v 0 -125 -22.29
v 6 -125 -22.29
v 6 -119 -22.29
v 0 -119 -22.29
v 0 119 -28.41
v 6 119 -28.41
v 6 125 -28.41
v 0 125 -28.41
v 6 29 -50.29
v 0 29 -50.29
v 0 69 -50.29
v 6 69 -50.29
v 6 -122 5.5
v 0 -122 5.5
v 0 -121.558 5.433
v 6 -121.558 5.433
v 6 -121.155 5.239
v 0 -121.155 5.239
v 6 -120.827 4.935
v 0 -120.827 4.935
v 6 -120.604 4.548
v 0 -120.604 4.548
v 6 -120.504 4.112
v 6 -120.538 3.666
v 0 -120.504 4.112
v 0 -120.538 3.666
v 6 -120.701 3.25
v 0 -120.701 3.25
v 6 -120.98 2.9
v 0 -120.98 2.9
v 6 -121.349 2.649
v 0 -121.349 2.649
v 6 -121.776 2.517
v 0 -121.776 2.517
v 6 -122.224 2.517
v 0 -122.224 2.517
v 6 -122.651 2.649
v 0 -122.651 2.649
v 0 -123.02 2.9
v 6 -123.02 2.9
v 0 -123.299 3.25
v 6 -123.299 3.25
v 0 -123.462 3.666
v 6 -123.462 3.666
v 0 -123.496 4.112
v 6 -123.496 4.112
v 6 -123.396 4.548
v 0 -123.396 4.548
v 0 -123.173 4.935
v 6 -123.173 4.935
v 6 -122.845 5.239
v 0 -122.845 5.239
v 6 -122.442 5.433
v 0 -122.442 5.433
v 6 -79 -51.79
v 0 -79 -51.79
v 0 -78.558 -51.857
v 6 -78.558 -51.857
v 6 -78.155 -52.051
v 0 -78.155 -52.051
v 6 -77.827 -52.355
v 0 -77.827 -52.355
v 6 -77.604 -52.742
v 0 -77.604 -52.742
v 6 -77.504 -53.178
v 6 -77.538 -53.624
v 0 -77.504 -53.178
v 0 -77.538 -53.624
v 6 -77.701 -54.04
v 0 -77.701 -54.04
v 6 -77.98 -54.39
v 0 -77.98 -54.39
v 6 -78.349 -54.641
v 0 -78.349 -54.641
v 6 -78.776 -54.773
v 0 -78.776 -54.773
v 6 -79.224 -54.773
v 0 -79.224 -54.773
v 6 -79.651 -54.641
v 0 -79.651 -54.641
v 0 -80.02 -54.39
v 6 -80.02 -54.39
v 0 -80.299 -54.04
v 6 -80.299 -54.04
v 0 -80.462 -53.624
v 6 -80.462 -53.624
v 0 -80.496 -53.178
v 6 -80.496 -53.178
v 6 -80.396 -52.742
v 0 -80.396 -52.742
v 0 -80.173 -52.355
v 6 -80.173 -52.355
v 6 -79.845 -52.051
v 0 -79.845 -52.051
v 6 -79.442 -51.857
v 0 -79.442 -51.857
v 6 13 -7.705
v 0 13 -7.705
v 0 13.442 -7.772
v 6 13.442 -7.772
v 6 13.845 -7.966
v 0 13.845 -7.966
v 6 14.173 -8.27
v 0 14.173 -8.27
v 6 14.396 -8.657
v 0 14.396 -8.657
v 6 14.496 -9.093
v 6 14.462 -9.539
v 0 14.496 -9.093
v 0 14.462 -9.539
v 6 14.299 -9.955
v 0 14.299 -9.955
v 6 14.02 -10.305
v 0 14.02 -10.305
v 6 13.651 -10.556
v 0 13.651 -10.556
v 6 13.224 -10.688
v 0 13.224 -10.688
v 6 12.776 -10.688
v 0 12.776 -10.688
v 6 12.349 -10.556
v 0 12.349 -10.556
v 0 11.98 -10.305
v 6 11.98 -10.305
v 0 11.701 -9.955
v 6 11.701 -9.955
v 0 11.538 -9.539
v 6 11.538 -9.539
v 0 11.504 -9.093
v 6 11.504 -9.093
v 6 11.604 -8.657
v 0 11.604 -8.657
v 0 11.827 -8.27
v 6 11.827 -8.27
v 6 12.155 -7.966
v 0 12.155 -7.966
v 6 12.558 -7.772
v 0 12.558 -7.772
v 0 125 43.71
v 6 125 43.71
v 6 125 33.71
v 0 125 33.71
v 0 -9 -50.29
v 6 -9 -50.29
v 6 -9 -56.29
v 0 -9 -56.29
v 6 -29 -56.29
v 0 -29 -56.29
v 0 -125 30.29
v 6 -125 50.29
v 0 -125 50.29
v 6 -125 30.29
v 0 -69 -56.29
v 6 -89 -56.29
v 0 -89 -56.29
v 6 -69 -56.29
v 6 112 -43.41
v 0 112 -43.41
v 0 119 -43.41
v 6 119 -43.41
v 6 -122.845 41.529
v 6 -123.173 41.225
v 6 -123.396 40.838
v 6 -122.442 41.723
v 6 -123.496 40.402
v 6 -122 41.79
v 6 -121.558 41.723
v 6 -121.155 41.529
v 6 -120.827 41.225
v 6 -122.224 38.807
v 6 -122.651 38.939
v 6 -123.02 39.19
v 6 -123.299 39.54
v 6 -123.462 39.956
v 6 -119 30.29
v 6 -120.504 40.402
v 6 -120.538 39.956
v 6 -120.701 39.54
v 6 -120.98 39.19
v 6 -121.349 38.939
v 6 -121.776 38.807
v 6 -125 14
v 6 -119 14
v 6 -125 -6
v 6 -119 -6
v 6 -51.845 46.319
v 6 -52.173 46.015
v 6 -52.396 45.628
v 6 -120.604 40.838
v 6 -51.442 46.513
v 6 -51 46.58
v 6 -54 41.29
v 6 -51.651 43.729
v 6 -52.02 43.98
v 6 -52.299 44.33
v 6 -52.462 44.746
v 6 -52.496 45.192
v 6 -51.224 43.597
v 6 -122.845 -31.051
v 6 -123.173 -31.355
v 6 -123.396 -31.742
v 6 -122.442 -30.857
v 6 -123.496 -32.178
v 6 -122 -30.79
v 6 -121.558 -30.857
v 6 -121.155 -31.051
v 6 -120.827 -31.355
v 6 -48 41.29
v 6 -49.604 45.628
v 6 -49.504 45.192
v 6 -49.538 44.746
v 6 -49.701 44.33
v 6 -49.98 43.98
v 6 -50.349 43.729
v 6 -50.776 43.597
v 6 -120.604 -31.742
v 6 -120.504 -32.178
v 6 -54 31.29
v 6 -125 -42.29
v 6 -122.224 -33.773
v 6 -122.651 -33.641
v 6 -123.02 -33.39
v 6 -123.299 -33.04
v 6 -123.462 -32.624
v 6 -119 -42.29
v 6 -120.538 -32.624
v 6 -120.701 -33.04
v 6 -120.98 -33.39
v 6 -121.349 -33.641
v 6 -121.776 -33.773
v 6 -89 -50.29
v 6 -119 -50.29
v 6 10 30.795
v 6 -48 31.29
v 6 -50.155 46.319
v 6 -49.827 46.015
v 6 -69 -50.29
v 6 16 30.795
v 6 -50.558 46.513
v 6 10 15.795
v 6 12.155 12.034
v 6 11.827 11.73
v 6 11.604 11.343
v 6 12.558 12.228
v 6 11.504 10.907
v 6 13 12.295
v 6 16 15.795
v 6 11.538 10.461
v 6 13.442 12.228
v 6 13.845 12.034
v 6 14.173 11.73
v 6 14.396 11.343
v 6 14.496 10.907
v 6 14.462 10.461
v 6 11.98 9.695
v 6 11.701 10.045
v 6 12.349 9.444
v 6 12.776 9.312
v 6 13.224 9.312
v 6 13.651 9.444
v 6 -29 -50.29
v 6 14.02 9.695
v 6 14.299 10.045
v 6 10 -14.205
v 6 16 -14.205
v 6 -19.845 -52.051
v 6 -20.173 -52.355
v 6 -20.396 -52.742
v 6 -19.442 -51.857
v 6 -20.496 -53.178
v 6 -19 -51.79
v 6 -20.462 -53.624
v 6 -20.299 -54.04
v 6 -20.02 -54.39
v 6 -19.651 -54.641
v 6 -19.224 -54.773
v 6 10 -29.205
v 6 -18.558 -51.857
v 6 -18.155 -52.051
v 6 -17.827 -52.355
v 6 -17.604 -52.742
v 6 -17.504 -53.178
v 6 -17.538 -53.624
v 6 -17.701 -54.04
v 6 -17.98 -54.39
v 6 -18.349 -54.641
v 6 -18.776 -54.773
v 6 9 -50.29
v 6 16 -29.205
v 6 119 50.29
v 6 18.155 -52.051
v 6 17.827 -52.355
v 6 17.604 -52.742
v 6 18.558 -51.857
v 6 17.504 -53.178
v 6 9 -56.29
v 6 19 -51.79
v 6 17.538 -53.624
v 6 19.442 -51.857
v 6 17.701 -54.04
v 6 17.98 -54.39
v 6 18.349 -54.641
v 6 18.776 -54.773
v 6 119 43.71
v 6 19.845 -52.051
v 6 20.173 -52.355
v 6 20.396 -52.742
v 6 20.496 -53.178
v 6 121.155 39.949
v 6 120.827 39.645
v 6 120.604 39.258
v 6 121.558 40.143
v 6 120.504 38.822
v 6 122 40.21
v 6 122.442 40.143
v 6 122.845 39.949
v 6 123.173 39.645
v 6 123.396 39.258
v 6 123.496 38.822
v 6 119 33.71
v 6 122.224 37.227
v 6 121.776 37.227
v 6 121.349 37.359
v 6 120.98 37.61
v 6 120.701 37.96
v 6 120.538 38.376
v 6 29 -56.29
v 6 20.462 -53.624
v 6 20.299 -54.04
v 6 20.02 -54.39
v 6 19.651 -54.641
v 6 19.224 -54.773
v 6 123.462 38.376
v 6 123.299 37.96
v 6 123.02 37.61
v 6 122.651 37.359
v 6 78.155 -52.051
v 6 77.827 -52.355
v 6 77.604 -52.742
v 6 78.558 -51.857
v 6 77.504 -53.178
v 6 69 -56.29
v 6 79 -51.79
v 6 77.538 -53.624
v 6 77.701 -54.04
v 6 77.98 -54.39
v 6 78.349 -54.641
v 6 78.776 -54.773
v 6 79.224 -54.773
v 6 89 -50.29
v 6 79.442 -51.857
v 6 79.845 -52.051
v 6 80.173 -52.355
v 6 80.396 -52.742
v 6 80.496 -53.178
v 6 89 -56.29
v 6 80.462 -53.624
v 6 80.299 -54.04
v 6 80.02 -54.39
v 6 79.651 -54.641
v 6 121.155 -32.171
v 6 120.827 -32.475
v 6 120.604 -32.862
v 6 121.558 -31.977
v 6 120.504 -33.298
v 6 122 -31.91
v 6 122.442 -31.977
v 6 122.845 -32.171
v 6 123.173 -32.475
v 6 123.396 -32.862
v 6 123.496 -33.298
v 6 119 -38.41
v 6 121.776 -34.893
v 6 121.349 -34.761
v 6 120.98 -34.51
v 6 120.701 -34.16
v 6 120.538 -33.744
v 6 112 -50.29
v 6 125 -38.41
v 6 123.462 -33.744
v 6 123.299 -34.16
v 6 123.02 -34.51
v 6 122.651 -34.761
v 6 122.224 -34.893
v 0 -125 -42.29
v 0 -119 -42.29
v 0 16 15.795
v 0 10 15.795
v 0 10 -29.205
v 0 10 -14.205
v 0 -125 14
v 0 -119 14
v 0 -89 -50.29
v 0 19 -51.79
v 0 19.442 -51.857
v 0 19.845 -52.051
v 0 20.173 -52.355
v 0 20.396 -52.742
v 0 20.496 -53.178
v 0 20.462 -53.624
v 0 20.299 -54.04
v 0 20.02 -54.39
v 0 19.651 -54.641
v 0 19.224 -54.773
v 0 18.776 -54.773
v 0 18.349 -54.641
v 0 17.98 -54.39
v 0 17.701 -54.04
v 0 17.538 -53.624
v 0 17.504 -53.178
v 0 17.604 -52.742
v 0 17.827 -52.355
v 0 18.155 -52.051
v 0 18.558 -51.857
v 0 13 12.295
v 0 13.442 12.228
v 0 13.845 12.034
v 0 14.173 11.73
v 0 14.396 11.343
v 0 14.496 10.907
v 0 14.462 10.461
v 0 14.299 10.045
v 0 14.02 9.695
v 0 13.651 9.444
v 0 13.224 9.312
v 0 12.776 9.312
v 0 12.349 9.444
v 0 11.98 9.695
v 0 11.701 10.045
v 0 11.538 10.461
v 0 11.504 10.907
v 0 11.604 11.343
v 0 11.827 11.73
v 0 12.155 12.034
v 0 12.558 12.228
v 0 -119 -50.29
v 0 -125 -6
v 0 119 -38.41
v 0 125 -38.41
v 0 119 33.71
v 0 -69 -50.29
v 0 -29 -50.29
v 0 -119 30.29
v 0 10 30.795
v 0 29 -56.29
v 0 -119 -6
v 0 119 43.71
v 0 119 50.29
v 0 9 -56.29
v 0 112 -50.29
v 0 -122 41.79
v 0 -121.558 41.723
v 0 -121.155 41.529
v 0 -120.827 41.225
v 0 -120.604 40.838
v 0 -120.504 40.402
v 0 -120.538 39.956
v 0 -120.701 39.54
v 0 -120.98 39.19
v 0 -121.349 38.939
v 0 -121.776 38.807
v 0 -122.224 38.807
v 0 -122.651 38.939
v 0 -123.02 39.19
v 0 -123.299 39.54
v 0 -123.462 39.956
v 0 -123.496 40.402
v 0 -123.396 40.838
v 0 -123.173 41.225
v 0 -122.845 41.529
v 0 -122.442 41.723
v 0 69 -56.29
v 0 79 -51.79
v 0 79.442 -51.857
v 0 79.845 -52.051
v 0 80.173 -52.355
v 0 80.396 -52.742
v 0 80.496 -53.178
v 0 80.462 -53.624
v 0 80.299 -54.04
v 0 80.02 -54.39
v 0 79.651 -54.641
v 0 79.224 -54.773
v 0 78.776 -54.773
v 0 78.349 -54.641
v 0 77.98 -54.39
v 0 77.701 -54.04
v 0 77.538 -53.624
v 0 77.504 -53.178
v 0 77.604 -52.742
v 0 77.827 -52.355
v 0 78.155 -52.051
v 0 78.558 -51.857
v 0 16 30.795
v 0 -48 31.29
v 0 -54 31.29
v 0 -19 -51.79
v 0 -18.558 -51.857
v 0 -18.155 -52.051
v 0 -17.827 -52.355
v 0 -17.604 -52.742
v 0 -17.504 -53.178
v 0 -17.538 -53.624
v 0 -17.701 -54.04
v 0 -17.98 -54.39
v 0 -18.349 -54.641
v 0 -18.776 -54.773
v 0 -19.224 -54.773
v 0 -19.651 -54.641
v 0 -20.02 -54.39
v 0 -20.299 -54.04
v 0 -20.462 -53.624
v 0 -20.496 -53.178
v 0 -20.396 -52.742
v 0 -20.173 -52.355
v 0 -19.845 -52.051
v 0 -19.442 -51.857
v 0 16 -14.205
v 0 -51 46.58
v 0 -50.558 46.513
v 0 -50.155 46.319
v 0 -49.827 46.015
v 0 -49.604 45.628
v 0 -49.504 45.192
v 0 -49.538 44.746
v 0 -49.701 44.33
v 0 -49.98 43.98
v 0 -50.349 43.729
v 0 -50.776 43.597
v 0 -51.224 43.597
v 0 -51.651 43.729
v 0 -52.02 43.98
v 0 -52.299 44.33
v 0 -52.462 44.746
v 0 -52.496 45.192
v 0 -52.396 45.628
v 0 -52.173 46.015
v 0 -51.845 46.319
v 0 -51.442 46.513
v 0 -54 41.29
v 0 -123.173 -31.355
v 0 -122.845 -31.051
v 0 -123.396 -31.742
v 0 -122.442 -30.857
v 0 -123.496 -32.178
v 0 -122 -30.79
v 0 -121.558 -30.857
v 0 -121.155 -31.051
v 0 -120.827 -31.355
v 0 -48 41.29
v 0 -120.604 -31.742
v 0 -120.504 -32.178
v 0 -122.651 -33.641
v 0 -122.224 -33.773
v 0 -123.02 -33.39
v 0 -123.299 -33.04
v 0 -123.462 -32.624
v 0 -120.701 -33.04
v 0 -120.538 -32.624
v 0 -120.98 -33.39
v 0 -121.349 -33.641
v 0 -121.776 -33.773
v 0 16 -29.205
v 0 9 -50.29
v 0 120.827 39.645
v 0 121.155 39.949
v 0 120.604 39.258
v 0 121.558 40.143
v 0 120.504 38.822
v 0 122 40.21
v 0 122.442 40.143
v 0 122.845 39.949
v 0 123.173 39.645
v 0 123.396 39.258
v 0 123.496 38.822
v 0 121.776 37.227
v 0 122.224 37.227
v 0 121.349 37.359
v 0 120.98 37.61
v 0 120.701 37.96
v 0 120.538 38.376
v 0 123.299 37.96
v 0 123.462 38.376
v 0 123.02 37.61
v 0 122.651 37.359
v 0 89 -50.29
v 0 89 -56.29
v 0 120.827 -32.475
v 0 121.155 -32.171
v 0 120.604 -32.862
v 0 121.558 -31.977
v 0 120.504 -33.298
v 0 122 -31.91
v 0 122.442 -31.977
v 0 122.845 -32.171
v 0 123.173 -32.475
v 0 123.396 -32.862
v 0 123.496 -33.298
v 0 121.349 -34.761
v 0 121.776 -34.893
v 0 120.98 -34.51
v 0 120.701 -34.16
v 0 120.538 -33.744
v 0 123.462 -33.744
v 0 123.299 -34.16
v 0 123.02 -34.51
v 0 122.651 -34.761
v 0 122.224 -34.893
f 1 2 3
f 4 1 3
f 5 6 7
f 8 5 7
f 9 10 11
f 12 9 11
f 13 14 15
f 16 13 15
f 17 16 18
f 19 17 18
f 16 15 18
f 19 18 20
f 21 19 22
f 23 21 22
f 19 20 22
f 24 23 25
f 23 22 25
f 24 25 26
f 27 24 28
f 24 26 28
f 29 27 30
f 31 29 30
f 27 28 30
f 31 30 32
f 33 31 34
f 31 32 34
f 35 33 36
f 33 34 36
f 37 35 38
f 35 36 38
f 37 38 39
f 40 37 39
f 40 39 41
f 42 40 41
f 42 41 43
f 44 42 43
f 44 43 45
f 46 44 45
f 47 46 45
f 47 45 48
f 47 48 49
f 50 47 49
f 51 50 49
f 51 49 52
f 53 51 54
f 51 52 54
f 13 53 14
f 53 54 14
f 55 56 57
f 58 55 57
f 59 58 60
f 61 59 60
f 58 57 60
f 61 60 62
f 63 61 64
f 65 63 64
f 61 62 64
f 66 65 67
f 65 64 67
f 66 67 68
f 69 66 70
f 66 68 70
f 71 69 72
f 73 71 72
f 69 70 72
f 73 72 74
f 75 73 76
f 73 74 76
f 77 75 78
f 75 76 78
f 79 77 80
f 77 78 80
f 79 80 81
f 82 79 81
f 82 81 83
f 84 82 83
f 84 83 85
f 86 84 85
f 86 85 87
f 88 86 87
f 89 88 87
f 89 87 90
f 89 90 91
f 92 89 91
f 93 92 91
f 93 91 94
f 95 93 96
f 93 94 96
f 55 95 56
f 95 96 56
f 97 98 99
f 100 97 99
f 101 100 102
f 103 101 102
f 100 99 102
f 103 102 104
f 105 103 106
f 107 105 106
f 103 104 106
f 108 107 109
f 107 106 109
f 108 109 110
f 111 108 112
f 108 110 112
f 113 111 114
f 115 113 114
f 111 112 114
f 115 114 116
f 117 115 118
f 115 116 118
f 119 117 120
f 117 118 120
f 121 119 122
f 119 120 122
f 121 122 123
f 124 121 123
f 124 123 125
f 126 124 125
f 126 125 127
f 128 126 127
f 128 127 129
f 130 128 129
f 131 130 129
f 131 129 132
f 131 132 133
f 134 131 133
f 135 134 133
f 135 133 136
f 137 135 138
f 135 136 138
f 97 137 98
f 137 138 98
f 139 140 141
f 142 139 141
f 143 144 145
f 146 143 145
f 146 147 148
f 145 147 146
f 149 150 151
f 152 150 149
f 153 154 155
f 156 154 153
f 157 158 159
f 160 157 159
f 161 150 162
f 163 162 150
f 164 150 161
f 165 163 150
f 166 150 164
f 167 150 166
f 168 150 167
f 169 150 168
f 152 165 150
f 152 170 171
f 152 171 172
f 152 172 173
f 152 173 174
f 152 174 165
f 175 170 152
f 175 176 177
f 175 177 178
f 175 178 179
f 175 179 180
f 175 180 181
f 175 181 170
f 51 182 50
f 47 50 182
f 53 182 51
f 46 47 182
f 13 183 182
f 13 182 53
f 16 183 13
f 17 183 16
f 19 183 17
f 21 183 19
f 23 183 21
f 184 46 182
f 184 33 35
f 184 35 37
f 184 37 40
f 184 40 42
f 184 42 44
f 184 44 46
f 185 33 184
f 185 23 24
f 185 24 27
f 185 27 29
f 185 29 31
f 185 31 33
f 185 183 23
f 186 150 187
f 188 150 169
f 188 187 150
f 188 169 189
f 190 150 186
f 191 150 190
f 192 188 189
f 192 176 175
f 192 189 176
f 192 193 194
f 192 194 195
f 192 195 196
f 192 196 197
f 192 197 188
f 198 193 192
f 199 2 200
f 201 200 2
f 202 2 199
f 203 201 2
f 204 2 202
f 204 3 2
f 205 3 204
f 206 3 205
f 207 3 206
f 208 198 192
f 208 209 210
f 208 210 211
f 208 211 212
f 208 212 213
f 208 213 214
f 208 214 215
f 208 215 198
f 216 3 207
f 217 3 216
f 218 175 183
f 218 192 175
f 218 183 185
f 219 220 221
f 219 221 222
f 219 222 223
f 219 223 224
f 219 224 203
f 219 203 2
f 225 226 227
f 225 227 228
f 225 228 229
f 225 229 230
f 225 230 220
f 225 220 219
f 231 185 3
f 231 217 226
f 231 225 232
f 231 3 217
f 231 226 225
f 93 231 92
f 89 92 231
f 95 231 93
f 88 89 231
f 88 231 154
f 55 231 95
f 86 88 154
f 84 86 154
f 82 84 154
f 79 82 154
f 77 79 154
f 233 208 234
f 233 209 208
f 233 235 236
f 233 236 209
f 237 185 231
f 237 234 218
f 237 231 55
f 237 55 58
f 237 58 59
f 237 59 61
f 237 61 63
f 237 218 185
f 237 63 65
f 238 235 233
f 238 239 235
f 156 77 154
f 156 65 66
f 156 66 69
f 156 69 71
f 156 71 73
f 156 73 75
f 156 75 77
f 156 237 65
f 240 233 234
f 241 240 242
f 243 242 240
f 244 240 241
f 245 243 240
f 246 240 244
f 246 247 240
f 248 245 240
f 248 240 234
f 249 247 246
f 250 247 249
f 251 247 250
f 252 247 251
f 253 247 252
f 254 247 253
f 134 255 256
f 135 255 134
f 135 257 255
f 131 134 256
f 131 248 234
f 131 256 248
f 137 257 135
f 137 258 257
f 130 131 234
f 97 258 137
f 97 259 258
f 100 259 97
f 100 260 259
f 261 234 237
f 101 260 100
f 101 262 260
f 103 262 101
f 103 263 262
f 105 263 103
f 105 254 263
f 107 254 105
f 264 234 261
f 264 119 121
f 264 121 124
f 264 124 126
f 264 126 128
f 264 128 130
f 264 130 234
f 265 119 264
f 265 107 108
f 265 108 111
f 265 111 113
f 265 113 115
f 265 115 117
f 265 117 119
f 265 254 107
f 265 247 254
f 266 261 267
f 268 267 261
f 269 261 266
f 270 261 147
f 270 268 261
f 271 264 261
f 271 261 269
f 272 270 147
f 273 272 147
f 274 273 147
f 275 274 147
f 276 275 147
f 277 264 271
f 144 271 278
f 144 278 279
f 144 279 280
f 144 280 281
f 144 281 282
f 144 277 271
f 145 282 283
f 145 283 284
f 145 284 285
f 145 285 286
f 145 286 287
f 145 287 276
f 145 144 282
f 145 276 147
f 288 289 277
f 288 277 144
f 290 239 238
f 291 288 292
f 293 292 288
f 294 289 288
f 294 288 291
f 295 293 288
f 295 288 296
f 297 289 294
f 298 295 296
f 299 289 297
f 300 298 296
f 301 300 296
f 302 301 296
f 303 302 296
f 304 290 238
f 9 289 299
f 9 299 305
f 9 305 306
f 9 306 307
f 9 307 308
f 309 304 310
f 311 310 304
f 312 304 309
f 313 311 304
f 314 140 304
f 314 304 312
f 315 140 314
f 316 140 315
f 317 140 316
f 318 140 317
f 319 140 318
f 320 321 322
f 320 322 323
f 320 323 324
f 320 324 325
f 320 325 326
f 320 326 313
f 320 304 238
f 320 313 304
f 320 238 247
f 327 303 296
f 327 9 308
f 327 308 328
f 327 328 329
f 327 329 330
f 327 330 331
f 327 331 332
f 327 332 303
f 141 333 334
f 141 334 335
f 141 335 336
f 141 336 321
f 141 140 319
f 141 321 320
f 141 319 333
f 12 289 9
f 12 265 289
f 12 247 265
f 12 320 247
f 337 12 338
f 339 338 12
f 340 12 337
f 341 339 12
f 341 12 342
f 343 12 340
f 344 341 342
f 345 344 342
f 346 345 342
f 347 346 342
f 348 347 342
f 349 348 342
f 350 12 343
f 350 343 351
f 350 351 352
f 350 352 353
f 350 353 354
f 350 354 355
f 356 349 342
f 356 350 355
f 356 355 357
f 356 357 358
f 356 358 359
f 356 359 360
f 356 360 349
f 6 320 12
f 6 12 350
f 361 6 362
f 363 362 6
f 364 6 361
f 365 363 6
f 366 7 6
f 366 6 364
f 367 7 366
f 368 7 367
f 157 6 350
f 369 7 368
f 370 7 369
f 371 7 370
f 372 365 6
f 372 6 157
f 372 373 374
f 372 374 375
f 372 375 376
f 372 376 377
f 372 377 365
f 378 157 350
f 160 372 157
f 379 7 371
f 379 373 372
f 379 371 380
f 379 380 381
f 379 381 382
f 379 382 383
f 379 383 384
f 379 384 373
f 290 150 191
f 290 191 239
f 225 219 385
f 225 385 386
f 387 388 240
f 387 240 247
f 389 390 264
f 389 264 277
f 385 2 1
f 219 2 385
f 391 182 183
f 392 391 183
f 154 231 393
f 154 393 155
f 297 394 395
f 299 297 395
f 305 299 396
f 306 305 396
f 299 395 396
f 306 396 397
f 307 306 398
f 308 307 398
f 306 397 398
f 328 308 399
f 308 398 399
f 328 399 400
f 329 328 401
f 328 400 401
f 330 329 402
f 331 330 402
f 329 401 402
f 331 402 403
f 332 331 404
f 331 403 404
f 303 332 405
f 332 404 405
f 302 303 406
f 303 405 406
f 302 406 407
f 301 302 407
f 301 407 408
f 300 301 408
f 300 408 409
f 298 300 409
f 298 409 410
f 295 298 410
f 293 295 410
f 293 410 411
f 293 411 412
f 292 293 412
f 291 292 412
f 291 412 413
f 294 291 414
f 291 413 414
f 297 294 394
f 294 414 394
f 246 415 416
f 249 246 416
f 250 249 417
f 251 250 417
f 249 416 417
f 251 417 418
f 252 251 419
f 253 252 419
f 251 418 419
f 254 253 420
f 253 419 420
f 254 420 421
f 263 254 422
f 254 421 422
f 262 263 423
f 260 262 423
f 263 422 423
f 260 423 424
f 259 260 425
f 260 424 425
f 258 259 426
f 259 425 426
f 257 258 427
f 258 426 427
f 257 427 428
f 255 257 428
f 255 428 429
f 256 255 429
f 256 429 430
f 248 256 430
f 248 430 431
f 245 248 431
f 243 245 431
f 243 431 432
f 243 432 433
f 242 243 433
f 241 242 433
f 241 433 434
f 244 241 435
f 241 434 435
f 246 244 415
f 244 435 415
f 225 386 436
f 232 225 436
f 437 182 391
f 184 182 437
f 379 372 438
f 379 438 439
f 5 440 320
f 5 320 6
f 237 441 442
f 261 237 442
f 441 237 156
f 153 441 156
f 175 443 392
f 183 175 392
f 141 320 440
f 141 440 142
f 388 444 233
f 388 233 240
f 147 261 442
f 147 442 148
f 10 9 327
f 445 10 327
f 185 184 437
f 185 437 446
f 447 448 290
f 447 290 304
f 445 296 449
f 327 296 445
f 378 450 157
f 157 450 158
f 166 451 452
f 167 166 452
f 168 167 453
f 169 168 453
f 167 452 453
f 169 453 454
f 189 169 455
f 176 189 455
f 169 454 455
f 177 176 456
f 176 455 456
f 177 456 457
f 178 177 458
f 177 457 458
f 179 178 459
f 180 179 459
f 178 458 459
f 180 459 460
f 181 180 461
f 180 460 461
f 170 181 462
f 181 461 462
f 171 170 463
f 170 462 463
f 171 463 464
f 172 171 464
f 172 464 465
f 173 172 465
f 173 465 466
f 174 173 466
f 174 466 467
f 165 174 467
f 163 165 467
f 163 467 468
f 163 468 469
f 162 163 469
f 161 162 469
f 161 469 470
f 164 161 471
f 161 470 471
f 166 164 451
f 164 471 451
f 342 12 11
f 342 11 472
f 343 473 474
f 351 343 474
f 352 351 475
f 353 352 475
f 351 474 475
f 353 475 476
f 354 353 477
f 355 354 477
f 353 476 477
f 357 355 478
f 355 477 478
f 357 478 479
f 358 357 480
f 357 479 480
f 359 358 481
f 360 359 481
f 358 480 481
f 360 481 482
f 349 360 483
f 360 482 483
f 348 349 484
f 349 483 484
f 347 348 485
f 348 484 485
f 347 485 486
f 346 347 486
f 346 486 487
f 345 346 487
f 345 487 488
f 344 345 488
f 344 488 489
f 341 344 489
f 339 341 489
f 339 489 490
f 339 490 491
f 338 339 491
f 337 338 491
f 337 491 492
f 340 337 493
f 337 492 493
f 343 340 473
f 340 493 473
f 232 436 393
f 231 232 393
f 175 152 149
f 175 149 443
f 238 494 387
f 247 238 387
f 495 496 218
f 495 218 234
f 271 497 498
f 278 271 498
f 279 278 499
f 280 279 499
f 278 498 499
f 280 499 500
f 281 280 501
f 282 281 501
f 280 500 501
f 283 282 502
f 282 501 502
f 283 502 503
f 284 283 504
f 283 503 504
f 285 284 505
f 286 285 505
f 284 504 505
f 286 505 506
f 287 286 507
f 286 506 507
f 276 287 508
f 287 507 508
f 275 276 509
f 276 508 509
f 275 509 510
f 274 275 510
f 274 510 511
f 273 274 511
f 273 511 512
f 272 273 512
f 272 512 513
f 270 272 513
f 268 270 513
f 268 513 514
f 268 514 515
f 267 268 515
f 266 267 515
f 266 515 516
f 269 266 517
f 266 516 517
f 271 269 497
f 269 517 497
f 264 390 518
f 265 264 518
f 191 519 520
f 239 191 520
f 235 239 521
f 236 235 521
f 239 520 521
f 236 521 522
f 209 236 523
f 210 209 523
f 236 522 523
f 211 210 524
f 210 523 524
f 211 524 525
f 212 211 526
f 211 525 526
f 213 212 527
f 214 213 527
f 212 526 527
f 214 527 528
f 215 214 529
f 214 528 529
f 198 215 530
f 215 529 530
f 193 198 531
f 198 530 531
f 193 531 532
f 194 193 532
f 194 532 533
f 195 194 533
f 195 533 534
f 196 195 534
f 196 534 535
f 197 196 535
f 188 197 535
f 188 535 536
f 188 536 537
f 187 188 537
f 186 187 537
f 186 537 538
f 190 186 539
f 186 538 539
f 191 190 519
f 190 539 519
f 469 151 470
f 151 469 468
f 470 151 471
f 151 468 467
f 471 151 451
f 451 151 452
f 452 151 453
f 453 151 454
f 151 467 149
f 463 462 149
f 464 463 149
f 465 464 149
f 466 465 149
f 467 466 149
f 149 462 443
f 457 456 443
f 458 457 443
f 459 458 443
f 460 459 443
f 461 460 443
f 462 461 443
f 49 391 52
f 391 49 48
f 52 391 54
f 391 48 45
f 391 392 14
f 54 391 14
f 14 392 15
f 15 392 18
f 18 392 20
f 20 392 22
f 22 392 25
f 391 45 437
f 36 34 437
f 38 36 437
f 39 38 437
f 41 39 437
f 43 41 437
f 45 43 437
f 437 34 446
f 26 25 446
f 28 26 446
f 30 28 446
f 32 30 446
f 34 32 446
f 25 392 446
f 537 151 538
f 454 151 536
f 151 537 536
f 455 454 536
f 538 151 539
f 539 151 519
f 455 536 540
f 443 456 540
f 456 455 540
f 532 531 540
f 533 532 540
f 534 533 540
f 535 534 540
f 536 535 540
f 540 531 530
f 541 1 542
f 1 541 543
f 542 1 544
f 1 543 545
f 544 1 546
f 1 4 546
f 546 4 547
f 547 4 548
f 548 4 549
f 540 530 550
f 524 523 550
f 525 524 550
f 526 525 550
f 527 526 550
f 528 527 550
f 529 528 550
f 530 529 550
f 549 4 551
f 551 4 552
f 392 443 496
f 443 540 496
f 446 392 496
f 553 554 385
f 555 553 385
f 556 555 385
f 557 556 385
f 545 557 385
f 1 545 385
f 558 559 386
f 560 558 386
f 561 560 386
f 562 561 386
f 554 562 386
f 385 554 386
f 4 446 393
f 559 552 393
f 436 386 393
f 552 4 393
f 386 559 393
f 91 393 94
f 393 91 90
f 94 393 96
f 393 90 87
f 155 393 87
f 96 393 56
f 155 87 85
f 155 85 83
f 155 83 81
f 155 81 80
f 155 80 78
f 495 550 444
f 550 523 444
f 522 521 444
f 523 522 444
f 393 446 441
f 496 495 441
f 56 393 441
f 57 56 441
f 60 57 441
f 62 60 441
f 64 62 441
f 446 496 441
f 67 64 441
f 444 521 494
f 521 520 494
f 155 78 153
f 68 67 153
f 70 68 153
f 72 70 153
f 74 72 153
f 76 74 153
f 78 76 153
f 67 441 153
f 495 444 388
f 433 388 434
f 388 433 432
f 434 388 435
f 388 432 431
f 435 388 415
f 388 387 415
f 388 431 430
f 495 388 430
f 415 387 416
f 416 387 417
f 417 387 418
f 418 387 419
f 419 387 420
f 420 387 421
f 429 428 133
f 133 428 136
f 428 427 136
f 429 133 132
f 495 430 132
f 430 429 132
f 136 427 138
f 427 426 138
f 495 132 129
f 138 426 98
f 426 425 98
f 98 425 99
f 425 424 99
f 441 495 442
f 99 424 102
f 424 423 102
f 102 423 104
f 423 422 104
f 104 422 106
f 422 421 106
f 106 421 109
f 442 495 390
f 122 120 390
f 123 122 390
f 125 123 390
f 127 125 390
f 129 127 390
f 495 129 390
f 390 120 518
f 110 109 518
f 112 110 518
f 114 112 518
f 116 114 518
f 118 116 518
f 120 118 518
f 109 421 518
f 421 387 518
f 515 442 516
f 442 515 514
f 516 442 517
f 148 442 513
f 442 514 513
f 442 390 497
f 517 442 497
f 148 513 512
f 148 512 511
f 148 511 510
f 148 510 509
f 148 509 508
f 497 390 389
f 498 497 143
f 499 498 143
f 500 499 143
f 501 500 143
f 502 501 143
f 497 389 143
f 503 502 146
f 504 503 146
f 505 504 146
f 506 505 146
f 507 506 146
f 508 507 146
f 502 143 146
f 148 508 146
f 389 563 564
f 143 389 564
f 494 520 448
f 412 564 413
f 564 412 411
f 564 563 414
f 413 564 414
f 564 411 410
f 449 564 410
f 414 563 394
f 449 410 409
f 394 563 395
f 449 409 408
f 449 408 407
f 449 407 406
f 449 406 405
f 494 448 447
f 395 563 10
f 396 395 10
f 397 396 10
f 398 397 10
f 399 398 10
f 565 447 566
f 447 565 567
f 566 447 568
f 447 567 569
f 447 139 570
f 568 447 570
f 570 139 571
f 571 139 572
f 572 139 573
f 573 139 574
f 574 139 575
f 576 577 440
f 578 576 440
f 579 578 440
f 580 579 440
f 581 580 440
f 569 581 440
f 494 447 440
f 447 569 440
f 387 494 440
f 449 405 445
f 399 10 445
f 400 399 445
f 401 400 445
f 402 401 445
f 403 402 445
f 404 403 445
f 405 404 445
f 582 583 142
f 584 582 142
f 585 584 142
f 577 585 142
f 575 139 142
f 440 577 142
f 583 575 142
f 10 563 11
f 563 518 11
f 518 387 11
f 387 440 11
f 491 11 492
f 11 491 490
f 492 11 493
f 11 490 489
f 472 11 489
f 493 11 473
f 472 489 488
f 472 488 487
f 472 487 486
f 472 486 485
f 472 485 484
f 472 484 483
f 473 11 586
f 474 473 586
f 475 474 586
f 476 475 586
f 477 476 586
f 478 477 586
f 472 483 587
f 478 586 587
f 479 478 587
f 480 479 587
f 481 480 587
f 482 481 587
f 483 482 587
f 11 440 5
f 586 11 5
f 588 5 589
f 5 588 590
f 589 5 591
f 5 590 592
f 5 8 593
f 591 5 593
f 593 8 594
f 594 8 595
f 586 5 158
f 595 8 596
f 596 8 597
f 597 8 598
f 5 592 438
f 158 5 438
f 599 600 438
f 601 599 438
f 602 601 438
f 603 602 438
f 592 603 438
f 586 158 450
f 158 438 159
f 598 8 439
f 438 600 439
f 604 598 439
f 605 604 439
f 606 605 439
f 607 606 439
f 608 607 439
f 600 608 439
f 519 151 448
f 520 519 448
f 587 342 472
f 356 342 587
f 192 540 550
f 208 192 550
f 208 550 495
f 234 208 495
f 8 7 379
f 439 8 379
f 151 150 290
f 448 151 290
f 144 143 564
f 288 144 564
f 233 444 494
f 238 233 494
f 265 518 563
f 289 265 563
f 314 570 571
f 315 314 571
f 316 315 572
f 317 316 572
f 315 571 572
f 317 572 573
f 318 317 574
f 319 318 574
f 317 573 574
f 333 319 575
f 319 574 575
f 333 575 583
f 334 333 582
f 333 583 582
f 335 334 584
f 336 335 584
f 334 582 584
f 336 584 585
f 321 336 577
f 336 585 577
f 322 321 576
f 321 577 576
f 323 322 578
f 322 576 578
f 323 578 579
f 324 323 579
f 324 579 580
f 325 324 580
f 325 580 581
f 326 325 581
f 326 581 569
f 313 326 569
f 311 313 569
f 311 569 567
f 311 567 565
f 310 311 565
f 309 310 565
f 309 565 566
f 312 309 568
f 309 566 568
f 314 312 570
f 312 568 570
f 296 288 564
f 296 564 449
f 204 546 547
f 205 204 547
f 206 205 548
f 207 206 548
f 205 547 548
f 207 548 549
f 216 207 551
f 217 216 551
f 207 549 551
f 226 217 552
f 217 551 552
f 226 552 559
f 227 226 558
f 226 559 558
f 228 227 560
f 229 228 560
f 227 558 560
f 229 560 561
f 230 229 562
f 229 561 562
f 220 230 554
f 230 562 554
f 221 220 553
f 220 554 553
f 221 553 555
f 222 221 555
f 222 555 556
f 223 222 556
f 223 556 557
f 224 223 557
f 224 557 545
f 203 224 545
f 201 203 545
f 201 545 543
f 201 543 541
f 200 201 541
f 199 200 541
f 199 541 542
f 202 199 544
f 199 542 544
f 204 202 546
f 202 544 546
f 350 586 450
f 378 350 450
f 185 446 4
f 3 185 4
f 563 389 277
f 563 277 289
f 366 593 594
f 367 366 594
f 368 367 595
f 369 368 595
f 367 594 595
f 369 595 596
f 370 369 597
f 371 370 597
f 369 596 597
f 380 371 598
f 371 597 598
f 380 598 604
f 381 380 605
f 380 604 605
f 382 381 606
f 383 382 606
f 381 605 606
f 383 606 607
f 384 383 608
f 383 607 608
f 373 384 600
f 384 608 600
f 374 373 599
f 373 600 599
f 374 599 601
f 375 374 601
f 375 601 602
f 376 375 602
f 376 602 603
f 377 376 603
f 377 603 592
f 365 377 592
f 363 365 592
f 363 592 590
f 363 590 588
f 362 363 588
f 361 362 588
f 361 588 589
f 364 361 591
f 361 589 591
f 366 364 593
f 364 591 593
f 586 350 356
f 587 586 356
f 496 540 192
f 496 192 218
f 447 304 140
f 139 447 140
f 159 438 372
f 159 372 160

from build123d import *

# Parameters (mm, degrees)
ESQUISSE1_W             = 100.58
ESQUISSE1_H             = 238
ESQUISSE1_W_2           = 10
ESQUISSE1_H_2           = 6
ESQUISSE1_W_3           = 15
BOSS_EXTRU_1_DEPTH      = 6
ESQUISSE3_W             = 20
ESQUISSE3_H             = 6
ESQUISSE3_W_2           = 6
ESQUISSE3_H_2           = 20
ESQUISSE3_W_3           = 10
BOSS_EXTRU_5_DEPTH      = 6
ESQUISSE7_W             = 6.88
ESQUISSE7_H             = 7
ENL_V_MAT_EXTRU_3_DEPTH = 6
ESQUISSE8_R             = 1.5
ENL_V_MAT_EXTRU_4_DEPTH = 6


with BuildPart() as part:
    # Esquisse1 → Boss.-Extru.1 (new body)
    with BuildSketch(Plane(origin=(0, 0, 0), x_dir=(0, 0, -1), z_dir=(1, 0, 0))):
        Rectangle(ESQUISSE1_W, ESQUISSE1_H)
        with Locations((-36.29, -51)):
            Rectangle(ESQUISSE1_W_2, ESQUISSE1_H_2, mode=Mode.SUBTRACT)
        with Locations((-23.295, 13)):
            Rectangle(ESQUISSE1_W_3, ESQUISSE1_H_2, mode=Mode.SUBTRACT)
        with Locations((21.705, 13)):
            Rectangle(ESQUISSE1_W_3, ESQUISSE1_H_2, mode=Mode.SUBTRACT)
    extrude(amount=BOSS_EXTRU_1_DEPTH)

    # Esquisse3 → Boss.-Extru.5 (add)
    with BuildSketch(Plane(origin=(6, 0, 0), x_dir=(0, 0, -1), z_dir=(1, 0, 0))):
        with Locations((-40.29, -122)):
            Rectangle(ESQUISSE3_W, ESQUISSE3_H)
        with Locations((32.29, -122)):
            Rectangle(ESQUISSE3_W, ESQUISSE3_H)
        with Locations((53.29, 19)):
            Rectangle(ESQUISSE3_W_2, ESQUISSE3_H_2)
        with Locations((53.29, 79)):
            Rectangle(ESQUISSE3_W_2, ESQUISSE3_H_2)
        with Locations((53.29, -79)):
            Rectangle(ESQUISSE3_W_2, ESQUISSE3_H_2)
        with Locations((53.29, -19)):
            Rectangle(ESQUISSE3_W_2, ESQUISSE3_H_2)
        with Locations((-4, -122)):
            Rectangle(ESQUISSE3_W, ESQUISSE3_H)
        with Locations((33.41, 122)):
            Rectangle(ESQUISSE3_W_3, ESQUISSE3_H)
        with Locations((-38.71, 122)):
            Rectangle(ESQUISSE3_W_3, ESQUISSE3_H)
    extrude(amount=-BOSS_EXTRU_5_DEPTH)

    # Esquisse7 → Enlèv. mat.-Extru.3 (cut)
    with BuildSketch(Plane.ZY):
        with Locations((-46.85, 115.5)):
            Rectangle(ESQUISSE7_W, ESQUISSE7_H)
    extrude(amount=-ENL_V_MAT_EXTRU_3_DEPTH, mode=Mode.SUBTRACT)

    # Esquisse8 → Enlèv. mat.-Extru.4 (cut)
    with BuildSketch(Plane.ZY):
        with Locations((4, -122)):
            Circle(ESQUISSE8_R)
        with Locations((-9.205, 13)):
            Circle(ESQUISSE8_R)
        with Locations((10.795, 13)):
            Circle(ESQUISSE8_R)
        with Locations((45.08, -51)):
            Circle(ESQUISSE8_R)
        with Locations((38.71, 122)):
            Circle(ESQUISSE8_R)
        with Locations((-33.41, 122)):
            Circle(ESQUISSE8_R)
        with Locations((40.29, -122)):
            Circle(ESQUISSE8_R)
        with Locations((-53.29, 79)):
            Circle(ESQUISSE8_R)
        with Locations((-32.29, -122)):
            Circle(ESQUISSE8_R)
        with Locations((-53.29, 19)):
            Circle(ESQUISSE8_R)
        with Locations((-53.29, -79)):
            Circle(ESQUISSE8_R)
        with Locations((-53.29, -19)):
            Circle(ESQUISSE8_R)
    extrude(amount=-ENL_V_MAT_EXTRU_4_DEPTH, mode=Mode.SUBTRACT)


solid = part.part
